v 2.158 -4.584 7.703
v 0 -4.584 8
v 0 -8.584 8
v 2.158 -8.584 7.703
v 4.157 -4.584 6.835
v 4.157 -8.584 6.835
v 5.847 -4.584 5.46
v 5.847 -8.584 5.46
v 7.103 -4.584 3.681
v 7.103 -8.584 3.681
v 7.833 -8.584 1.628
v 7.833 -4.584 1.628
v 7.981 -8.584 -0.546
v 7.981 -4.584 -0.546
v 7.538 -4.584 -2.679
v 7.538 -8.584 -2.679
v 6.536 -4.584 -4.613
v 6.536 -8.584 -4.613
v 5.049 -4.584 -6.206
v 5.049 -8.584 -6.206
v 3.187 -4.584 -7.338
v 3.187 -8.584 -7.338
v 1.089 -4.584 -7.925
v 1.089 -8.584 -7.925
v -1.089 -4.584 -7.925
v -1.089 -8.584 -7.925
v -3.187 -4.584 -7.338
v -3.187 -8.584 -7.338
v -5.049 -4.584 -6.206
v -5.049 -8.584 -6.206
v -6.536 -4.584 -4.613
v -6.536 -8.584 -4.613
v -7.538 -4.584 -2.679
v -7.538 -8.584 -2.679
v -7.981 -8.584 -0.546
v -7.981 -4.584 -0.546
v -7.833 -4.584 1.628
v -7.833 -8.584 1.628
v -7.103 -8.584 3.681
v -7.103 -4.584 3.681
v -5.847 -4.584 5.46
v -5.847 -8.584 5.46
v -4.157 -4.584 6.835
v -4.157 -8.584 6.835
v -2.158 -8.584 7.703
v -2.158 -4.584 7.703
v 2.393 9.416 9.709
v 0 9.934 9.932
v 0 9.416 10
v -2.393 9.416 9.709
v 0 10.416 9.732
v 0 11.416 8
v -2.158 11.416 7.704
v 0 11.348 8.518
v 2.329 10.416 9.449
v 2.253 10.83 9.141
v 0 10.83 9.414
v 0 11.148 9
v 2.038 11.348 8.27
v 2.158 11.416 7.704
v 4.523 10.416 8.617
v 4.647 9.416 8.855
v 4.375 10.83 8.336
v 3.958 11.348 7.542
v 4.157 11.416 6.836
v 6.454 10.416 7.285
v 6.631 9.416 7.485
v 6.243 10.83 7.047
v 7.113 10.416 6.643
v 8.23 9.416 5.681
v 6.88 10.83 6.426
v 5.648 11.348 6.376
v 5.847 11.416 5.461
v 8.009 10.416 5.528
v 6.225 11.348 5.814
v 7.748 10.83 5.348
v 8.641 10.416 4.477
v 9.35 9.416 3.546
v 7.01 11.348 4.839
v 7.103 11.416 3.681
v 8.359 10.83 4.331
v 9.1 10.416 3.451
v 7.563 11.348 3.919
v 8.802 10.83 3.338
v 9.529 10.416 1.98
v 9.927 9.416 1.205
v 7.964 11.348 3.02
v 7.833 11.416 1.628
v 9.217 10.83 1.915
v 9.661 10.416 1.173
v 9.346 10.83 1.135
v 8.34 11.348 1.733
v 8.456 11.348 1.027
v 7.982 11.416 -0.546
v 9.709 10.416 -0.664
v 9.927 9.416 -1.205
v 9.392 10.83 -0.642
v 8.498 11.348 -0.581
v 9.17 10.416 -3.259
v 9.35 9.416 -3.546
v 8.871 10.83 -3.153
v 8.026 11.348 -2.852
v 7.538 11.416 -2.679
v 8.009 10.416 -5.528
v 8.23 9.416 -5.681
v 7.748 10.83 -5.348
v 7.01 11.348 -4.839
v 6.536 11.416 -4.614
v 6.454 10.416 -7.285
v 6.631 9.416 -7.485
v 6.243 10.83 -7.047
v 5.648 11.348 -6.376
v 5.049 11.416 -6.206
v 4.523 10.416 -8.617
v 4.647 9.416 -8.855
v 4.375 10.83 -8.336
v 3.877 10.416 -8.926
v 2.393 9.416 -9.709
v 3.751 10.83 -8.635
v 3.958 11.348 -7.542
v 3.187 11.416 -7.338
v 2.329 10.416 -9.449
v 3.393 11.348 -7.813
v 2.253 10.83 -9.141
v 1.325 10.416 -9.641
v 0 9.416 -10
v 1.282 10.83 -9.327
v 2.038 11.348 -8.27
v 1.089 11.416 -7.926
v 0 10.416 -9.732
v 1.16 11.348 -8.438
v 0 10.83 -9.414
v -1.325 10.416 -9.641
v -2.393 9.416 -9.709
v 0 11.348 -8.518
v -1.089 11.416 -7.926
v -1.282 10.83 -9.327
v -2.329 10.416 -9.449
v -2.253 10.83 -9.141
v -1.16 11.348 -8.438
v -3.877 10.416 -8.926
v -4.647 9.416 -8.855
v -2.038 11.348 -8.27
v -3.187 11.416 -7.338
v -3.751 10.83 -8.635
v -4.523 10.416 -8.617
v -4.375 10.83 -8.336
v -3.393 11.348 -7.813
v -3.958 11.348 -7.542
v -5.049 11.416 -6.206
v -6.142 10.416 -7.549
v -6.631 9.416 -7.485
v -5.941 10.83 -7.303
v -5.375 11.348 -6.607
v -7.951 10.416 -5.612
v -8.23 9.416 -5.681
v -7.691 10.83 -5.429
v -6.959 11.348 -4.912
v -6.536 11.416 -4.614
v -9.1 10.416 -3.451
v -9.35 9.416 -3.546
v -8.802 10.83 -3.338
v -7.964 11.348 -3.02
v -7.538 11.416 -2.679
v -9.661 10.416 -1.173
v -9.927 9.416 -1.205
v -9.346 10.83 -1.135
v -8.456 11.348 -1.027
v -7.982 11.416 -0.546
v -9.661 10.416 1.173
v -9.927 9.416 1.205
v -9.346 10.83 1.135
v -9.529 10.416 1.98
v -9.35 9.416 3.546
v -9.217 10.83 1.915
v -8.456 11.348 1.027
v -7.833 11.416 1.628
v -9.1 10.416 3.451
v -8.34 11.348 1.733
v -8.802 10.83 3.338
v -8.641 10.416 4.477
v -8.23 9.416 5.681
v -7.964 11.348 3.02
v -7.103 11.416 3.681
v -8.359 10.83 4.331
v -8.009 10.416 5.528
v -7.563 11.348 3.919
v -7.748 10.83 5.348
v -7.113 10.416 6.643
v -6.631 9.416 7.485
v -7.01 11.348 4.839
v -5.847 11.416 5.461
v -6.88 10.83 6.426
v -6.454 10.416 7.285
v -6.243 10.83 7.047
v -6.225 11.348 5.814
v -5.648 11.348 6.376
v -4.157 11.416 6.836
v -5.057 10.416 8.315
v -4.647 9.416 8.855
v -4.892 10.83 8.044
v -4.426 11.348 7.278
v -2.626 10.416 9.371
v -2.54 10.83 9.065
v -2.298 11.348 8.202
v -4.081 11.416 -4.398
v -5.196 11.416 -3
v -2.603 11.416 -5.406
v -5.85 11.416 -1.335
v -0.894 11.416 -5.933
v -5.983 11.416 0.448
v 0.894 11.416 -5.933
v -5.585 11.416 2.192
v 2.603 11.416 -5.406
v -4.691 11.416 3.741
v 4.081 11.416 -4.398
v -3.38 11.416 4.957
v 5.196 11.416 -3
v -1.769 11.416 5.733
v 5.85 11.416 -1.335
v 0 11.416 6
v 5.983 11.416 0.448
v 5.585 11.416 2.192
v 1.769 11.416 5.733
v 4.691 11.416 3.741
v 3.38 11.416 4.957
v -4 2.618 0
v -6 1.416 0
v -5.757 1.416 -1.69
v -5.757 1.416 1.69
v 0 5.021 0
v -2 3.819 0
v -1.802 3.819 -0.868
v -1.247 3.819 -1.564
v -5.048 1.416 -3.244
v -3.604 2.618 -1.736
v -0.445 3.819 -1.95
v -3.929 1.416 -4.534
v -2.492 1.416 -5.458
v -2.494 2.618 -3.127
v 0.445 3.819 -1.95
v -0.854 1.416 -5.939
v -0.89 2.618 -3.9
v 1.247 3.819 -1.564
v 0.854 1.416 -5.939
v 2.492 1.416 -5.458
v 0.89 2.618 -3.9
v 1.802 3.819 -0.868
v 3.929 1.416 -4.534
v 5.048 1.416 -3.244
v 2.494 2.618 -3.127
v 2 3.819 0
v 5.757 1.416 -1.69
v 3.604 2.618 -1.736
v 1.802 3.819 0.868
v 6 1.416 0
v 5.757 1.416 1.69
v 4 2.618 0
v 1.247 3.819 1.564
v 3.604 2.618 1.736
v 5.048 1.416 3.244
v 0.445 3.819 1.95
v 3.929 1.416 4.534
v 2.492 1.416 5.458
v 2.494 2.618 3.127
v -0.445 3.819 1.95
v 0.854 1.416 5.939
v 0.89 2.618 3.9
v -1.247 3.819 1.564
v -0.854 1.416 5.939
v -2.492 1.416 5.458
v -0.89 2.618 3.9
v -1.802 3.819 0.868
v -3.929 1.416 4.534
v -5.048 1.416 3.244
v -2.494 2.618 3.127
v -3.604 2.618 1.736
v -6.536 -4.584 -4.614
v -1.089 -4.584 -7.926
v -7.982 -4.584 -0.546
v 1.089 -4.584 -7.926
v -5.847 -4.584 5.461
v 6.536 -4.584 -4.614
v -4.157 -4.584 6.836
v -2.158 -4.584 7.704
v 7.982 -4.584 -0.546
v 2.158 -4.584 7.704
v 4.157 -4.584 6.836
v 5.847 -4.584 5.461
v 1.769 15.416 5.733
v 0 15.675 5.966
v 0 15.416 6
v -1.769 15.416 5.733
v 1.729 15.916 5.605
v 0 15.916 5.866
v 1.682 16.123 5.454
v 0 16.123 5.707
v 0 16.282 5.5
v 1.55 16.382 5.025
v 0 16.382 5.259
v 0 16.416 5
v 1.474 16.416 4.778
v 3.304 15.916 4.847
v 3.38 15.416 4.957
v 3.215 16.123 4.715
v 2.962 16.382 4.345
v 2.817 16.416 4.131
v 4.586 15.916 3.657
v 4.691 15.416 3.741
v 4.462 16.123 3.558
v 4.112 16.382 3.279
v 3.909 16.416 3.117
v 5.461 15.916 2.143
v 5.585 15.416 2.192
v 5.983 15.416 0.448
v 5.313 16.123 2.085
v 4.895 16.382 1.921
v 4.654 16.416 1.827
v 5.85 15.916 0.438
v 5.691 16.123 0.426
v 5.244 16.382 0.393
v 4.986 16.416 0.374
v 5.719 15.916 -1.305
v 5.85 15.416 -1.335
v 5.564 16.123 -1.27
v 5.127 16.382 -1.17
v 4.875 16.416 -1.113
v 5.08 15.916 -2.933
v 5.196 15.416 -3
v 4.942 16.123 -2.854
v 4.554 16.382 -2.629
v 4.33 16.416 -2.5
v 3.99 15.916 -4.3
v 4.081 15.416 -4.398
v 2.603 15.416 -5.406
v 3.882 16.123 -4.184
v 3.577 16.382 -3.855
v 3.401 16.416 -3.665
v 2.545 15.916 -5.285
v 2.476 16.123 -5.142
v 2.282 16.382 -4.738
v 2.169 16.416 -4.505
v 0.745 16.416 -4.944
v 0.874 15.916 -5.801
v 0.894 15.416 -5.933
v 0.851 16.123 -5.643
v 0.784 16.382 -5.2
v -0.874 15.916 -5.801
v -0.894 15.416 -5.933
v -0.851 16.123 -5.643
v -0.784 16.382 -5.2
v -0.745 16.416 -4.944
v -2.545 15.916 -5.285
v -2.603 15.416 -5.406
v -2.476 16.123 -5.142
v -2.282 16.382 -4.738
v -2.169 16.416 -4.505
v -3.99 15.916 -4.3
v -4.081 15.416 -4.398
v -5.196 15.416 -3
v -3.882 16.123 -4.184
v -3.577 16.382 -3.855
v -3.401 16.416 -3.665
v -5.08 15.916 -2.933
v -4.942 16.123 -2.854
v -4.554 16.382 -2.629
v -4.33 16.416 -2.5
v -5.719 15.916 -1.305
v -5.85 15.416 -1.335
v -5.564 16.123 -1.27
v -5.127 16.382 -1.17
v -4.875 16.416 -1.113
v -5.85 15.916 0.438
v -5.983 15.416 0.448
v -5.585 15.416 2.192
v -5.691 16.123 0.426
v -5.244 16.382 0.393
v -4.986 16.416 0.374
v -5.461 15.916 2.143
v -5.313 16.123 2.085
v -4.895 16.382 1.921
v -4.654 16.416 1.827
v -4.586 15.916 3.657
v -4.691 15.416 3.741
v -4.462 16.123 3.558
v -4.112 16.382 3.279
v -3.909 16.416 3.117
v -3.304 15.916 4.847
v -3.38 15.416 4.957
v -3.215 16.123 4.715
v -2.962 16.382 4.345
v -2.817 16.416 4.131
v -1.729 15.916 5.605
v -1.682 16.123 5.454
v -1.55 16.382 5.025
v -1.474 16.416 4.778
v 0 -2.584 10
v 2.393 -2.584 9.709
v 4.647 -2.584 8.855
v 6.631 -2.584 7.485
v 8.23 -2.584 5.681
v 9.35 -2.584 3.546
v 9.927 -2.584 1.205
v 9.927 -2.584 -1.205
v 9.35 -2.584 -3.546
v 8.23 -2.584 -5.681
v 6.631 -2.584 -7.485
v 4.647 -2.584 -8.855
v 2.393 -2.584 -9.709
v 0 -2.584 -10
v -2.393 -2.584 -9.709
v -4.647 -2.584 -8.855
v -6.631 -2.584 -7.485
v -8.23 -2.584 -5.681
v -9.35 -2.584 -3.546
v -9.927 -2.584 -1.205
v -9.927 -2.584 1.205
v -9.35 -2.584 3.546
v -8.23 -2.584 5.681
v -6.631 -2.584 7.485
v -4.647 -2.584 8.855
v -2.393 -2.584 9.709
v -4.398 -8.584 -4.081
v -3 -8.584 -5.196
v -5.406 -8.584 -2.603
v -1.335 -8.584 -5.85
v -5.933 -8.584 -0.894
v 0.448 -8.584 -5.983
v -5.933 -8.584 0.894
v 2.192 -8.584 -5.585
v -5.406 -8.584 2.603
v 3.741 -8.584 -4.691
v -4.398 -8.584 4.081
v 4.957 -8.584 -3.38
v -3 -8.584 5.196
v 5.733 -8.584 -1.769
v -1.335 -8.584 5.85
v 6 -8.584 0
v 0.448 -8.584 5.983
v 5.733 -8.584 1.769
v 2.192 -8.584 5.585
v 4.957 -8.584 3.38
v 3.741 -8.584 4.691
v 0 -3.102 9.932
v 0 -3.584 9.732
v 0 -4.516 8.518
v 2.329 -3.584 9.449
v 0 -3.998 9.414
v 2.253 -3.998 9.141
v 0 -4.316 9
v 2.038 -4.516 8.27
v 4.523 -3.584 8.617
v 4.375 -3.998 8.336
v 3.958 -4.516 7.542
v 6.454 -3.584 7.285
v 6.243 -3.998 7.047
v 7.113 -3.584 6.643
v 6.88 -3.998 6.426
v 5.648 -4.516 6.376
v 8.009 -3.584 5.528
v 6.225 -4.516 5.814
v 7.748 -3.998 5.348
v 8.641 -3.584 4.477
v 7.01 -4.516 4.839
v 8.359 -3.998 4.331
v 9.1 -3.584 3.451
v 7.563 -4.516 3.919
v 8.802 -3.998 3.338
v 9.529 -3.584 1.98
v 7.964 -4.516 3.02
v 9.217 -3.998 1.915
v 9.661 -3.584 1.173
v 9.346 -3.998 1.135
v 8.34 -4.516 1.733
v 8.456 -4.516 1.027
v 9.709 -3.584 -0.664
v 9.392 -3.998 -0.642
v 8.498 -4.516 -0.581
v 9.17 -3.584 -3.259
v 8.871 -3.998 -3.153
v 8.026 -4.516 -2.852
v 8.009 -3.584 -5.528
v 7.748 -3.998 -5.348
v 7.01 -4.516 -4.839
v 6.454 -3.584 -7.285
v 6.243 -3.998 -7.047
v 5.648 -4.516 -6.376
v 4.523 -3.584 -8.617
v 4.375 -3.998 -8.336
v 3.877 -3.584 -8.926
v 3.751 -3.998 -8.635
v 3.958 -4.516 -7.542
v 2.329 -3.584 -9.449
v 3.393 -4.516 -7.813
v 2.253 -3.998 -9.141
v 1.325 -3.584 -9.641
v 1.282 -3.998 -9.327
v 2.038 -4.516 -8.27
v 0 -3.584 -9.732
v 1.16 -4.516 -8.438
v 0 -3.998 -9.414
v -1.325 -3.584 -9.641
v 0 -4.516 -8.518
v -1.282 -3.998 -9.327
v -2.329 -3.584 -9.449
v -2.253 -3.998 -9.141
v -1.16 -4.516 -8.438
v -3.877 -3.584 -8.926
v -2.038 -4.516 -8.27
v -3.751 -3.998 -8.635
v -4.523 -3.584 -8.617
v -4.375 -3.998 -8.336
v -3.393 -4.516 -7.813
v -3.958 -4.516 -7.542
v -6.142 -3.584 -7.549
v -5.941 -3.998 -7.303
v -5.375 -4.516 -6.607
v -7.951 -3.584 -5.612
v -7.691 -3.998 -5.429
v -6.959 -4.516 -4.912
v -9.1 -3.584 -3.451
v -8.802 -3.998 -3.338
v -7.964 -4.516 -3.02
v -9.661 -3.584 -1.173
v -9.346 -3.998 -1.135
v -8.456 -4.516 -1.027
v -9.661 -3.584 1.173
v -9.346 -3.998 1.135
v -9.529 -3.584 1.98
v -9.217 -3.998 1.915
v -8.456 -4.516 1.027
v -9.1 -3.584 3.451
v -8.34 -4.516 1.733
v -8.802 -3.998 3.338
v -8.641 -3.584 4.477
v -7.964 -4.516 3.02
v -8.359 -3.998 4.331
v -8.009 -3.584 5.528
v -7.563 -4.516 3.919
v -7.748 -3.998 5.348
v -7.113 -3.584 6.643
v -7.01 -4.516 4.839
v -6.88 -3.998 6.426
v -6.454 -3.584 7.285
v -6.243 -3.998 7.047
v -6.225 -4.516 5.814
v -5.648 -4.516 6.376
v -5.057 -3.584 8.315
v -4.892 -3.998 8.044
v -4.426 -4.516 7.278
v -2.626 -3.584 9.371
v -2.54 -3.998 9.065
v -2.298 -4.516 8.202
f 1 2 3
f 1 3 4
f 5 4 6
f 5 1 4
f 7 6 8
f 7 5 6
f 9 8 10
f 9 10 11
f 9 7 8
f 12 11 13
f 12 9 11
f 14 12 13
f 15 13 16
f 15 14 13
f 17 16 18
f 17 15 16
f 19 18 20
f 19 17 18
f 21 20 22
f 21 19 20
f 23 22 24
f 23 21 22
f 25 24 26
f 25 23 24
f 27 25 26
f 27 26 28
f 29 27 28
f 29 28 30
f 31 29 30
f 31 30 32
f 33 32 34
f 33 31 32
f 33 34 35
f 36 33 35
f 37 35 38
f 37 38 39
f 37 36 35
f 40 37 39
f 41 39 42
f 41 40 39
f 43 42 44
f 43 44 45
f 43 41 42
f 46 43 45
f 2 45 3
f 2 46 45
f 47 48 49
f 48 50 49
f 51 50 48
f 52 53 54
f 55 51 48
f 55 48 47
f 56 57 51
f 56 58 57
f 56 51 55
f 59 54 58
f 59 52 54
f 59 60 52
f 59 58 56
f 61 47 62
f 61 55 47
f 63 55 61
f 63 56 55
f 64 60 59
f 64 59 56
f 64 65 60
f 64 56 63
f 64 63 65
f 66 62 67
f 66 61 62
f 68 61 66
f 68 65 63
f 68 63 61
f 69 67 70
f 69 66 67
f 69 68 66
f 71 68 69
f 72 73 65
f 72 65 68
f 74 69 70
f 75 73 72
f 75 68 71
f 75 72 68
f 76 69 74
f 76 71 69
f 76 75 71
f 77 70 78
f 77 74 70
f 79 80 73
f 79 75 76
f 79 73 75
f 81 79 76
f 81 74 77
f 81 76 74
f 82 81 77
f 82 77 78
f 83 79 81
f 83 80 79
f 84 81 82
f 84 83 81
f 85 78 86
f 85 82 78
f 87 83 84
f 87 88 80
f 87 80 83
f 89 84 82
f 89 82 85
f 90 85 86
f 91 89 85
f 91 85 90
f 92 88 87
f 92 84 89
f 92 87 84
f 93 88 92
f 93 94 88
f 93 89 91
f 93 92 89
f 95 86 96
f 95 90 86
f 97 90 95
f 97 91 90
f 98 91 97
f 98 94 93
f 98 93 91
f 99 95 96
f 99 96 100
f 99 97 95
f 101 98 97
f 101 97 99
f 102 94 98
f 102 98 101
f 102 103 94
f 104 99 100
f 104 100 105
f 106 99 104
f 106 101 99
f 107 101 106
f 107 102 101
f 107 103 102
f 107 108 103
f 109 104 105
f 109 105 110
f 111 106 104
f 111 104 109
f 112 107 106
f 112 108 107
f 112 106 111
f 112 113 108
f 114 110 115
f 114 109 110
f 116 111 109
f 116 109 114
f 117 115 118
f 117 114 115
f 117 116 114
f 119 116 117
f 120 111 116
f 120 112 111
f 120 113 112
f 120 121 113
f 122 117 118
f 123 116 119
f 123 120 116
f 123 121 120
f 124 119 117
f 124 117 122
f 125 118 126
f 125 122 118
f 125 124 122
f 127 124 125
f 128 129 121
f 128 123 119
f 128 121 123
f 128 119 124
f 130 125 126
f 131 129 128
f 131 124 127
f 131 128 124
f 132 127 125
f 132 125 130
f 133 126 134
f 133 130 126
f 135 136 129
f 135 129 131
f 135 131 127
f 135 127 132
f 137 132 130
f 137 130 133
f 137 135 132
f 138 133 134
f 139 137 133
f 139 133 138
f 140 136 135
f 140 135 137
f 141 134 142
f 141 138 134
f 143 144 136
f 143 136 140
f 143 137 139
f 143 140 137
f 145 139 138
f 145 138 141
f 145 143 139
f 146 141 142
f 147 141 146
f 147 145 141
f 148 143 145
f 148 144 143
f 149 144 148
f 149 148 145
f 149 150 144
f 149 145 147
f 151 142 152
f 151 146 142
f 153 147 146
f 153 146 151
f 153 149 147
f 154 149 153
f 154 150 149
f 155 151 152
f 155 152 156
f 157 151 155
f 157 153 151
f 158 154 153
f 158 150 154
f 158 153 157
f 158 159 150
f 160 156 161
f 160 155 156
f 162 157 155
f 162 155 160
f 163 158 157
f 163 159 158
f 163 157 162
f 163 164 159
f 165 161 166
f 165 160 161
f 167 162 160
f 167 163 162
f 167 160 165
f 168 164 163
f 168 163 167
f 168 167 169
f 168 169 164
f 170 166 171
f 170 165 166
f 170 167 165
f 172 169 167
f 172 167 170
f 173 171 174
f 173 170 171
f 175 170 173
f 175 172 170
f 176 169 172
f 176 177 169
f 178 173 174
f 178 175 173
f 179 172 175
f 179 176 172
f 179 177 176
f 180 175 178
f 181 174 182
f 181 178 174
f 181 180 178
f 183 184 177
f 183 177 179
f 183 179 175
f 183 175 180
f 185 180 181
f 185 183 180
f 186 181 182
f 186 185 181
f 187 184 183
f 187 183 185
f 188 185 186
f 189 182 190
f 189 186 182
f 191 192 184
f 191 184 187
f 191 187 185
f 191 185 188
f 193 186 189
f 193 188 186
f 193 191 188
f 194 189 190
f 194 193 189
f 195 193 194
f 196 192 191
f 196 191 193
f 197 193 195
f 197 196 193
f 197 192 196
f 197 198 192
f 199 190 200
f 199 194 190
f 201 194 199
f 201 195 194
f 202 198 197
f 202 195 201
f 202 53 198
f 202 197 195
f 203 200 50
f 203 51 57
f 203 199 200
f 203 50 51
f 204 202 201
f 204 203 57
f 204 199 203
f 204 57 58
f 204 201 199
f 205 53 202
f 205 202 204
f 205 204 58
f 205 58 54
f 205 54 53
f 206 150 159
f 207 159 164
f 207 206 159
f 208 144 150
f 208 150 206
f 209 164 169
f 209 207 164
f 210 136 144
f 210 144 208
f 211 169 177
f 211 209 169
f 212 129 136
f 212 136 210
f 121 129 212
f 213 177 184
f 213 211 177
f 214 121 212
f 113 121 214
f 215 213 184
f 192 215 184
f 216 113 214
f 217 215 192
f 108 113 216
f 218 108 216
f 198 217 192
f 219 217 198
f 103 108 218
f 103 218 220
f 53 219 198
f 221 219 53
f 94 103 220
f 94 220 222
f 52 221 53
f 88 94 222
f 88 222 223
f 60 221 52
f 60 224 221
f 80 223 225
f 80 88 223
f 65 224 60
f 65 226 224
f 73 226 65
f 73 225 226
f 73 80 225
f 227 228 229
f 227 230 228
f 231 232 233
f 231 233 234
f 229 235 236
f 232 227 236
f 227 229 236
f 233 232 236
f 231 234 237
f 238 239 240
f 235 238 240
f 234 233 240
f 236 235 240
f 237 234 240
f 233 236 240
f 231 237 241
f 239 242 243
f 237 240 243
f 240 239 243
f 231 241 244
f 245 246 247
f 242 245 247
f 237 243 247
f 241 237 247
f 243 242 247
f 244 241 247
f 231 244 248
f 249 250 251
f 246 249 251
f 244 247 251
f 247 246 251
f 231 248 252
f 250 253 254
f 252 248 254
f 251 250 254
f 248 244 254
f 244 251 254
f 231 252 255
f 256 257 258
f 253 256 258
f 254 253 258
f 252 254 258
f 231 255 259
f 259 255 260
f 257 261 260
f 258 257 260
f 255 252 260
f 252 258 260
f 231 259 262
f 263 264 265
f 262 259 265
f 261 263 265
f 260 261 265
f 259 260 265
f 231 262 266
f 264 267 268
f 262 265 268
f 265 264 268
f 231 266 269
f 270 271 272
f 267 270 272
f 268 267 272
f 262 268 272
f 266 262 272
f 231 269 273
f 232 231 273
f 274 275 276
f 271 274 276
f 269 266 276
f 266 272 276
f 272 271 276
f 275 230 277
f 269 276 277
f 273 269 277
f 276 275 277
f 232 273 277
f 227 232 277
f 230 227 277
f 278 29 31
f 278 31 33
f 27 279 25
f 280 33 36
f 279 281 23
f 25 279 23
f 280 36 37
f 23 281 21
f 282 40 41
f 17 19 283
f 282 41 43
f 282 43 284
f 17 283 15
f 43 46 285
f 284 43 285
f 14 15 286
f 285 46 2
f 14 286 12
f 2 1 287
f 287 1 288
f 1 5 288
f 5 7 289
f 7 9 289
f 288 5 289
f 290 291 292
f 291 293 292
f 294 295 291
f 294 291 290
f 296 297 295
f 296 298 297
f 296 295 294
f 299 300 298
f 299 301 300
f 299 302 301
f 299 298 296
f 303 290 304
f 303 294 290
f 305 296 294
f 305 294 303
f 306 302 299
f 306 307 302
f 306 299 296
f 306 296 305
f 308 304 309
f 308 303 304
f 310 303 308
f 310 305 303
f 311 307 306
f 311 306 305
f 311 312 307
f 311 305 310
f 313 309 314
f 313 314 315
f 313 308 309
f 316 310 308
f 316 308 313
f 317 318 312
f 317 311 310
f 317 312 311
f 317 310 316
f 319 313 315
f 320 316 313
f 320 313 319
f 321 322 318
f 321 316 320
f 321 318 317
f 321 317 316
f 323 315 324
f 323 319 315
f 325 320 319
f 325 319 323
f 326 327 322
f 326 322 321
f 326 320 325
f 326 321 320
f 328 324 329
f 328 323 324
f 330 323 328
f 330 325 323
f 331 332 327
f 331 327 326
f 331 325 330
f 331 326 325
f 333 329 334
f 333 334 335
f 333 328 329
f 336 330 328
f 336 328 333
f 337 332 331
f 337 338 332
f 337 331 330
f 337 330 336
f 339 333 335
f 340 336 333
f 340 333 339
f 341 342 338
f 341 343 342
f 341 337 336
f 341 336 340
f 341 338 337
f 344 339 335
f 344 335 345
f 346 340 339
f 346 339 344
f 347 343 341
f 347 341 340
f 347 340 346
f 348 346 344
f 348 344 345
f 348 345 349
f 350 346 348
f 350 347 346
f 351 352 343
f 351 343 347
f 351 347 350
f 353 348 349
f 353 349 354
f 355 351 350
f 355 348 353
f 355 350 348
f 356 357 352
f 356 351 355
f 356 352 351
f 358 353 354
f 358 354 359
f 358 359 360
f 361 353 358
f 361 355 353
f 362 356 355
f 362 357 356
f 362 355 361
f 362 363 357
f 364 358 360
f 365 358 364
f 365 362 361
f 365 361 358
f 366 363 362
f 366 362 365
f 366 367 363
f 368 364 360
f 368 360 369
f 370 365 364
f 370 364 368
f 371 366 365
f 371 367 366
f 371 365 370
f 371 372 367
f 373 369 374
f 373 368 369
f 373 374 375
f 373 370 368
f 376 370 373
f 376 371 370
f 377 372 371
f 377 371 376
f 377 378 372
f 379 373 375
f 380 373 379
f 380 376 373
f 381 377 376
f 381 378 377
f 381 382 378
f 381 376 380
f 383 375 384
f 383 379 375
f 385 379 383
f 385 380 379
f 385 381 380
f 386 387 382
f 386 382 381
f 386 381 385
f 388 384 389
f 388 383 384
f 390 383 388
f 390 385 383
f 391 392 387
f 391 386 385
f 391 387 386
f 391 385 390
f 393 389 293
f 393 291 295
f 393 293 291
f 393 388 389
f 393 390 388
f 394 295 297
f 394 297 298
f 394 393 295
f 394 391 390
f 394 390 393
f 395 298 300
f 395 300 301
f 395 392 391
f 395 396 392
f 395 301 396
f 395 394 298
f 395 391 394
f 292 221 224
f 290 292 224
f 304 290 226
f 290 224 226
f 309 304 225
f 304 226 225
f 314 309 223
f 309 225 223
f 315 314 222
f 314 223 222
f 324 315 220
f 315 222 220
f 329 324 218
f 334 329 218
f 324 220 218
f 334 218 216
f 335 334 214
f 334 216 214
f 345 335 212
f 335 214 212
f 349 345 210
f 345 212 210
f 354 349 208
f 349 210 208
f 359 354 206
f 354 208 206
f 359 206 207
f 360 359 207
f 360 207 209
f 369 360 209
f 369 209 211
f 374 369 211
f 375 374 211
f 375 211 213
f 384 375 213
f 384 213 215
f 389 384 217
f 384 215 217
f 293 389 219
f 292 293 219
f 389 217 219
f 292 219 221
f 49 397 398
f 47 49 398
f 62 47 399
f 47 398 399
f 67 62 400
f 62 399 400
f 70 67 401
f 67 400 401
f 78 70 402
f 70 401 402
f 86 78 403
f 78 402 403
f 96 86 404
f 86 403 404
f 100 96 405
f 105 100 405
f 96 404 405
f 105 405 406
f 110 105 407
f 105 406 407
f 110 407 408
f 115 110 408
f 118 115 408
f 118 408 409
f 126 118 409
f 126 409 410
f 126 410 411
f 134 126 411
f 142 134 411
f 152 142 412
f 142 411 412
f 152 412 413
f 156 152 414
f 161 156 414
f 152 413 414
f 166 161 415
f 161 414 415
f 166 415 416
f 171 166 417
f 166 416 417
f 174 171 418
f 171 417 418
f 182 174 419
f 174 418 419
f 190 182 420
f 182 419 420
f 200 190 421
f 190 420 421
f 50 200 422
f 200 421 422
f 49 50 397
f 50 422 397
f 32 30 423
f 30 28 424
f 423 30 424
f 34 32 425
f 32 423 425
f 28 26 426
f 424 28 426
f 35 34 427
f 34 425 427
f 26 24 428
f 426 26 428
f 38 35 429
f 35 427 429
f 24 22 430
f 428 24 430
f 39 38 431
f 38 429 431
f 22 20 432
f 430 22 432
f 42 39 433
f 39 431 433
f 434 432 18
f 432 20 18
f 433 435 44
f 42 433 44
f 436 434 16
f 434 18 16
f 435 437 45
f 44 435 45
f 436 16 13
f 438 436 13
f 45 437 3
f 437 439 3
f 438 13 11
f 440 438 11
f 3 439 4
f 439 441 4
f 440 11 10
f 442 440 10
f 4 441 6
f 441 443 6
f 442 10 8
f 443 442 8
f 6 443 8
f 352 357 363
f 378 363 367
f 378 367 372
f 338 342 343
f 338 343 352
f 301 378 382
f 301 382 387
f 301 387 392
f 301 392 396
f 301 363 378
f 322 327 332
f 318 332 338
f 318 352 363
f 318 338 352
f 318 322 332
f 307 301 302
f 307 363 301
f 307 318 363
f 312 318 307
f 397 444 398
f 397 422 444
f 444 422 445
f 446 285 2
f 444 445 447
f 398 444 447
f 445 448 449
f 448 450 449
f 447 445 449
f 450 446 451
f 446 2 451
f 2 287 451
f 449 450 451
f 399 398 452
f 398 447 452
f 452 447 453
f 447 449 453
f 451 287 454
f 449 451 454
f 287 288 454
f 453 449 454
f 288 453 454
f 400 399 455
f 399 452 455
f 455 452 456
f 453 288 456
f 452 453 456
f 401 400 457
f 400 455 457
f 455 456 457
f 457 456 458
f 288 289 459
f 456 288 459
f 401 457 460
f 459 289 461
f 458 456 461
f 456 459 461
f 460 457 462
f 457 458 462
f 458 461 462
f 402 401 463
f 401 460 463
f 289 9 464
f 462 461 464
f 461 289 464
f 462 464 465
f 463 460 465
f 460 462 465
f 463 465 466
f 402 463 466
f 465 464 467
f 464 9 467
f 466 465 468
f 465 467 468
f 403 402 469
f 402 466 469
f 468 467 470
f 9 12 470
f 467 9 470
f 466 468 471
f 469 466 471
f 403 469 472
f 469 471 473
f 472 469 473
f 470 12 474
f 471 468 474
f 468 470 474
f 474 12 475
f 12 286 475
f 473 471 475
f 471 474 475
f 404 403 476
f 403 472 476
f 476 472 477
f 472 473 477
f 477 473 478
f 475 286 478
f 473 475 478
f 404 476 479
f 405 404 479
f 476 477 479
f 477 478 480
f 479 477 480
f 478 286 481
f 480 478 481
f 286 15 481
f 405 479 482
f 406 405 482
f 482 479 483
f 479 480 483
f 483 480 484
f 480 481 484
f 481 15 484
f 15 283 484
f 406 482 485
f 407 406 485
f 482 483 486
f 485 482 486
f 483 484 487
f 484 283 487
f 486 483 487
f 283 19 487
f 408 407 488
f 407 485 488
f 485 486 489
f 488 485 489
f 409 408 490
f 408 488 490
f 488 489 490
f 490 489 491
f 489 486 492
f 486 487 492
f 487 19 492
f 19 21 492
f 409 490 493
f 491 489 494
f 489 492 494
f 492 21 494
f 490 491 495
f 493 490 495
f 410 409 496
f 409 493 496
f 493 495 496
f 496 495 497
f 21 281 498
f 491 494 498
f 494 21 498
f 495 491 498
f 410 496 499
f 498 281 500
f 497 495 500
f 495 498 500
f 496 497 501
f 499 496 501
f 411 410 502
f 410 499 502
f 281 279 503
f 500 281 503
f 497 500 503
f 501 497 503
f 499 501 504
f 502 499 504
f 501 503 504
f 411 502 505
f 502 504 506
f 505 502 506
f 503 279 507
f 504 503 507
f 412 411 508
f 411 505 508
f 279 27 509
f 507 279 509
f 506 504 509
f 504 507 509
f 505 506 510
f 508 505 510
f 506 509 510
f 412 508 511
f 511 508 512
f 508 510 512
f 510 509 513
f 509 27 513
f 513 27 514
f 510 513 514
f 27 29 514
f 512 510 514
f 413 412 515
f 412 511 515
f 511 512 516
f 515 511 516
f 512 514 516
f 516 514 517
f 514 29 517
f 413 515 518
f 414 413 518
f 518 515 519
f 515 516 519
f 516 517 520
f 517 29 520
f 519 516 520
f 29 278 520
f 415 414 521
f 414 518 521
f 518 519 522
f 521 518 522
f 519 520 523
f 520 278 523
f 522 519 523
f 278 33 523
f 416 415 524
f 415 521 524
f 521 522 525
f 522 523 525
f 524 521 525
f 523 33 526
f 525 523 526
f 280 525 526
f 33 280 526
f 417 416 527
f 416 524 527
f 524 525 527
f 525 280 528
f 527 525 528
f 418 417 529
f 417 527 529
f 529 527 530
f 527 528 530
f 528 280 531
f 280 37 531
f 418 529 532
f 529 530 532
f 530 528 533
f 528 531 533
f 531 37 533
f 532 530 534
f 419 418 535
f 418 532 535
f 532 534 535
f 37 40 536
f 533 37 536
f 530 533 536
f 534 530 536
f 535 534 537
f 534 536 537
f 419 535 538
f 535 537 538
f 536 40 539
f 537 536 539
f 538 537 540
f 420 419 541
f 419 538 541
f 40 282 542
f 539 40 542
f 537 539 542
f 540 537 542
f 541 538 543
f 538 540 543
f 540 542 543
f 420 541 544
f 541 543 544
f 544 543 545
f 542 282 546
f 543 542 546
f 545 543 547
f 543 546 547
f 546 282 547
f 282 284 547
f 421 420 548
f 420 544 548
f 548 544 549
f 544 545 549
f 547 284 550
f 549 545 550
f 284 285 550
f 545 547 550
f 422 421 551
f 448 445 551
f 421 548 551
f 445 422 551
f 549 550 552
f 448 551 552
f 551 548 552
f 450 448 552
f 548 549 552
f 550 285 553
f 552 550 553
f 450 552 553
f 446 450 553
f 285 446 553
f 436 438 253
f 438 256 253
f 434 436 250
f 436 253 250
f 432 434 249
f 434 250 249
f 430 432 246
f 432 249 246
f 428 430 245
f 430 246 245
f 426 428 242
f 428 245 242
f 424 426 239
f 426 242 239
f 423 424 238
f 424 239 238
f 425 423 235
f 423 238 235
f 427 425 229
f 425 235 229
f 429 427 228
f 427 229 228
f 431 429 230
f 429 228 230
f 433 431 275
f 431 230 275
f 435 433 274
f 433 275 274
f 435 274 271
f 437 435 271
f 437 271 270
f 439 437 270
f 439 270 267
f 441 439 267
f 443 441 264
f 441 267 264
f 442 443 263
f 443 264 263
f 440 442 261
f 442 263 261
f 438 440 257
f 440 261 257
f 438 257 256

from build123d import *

# Parameters (mm, degrees)
SKETCH1_R        = 5
HEAD_DEPTH       = 8
SKETCH3_R        = 4
NECK_DEPTH       = 2
SKETCH6_R        = 3
HEAD_KNOB_DEPTH  = 2.5
HEAD_HOLE_D      = 6
HEAD_HOLE_DEPTH  = 5
HEAD_HOLE_TIP    = 1.802581857
HEAD_ROUNDNESS_R = 1
EADY_INSERT_R    = 0.5
SCALE1_SCALE     = 2


with BuildPart() as part:
    # Sketch1 → Head (new body)
    with BuildSketch(Plane(origin=(0, 0, 0), x_dir=(1, 0, 0), z_dir=(0, 1, 0))):
        with Locations(Location((0, 0, 0), (0, 0, 270))):
            Circle(SKETCH1_R)
    extrude(amount=HEAD_DEPTH)

    # Sketch3 → Neck (add)
    with BuildSketch(Plane(origin=(0, 0, 0), x_dir=(1, 0, 0), z_dir=(0, 1, 0))):
        with Locations(Location((0, 0, 0), (0, 0, 270))):
            Circle(SKETCH3_R)
    extrude(amount=-NECK_DEPTH)

    # Sketch6 → Head knob (add)
    with BuildSketch(Plane(origin=(0, 8, 0), x_dir=(1, 0, 0), z_dir=(0, 1, 0))):
        with Locations(Location((0, 0, 0), (0, 0, 270))):
            Circle(SKETCH6_R)
    extrude(amount=HEAD_KNOB_DEPTH)

    # Head hole
    with Locations(Plane(origin=(0, -2, 0), x_dir=(-1, 0, 0), z_dir=(0, -1, 0))):
        with Locations((0, 0)):
            Hole(HEAD_HOLE_D / 2, depth=HEAD_HOLE_DEPTH)
            with Locations((0, 0, -(HEAD_HOLE_DEPTH + HEAD_HOLE_TIP / 2))):  # 118° drill point
                Cone(0, HEAD_HOLE_D / 2, HEAD_HOLE_TIP, mode=Mode.SUBTRACT)

    # Head roundness
    head_roundness_edges = [part.edges().sort_by_distance(p)[0] for p in [
        (0, 0, -5),
        (0, 8, -5),
    ]]
    fillet(head_roundness_edges, radius=HEAD_ROUNDNESS_R - 0.0001)  # a hair under: the kernel refuses the full size

    # Eady insert
    eady_insert_edges = [part.edges().sort_by_distance(p)[0] for p in [
        (0, 10.5, -3),
    ]]
    fillet(eady_insert_edges, radius=EADY_INSERT_R)


with BuildPart() as part_1:
    # Scale1: scaled about (0, 4.58400844, 0)
    add(part.part.scale(SCALE1_SCALE).moved(Location((0, -4.58400844, 0))))


solid = part_1.part
